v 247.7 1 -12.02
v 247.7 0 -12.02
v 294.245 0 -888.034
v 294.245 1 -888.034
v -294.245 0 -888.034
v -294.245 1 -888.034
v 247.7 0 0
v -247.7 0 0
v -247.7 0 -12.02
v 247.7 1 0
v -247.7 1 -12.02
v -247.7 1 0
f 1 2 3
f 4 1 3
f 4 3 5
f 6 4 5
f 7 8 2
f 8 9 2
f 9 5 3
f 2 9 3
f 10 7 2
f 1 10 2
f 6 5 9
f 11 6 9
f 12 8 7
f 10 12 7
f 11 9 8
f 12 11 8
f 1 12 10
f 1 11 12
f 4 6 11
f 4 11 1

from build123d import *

# Parameters (mm, degrees)
FRONT_FLOOR_CLOSEOUT_DEPTH = 1


with BuildPart() as part:
    # Sketch1 → Front Floor Closeout (new body)
    with BuildSketch(Plane(origin=(0, 0, 0), x_dir=(1, 0, 0), z_dir=(0, 1, 0))):
        Polygon((-247.7, 0), (247.7, 0), (247.7, 12.02), (294.245, 888.034340907), (-294.245, 888.034340907), (-247.7, 12.02), align=None)
    extrude(amount=FRONT_FLOOR_CLOSEOUT_DEPTH)


solid = part.part
